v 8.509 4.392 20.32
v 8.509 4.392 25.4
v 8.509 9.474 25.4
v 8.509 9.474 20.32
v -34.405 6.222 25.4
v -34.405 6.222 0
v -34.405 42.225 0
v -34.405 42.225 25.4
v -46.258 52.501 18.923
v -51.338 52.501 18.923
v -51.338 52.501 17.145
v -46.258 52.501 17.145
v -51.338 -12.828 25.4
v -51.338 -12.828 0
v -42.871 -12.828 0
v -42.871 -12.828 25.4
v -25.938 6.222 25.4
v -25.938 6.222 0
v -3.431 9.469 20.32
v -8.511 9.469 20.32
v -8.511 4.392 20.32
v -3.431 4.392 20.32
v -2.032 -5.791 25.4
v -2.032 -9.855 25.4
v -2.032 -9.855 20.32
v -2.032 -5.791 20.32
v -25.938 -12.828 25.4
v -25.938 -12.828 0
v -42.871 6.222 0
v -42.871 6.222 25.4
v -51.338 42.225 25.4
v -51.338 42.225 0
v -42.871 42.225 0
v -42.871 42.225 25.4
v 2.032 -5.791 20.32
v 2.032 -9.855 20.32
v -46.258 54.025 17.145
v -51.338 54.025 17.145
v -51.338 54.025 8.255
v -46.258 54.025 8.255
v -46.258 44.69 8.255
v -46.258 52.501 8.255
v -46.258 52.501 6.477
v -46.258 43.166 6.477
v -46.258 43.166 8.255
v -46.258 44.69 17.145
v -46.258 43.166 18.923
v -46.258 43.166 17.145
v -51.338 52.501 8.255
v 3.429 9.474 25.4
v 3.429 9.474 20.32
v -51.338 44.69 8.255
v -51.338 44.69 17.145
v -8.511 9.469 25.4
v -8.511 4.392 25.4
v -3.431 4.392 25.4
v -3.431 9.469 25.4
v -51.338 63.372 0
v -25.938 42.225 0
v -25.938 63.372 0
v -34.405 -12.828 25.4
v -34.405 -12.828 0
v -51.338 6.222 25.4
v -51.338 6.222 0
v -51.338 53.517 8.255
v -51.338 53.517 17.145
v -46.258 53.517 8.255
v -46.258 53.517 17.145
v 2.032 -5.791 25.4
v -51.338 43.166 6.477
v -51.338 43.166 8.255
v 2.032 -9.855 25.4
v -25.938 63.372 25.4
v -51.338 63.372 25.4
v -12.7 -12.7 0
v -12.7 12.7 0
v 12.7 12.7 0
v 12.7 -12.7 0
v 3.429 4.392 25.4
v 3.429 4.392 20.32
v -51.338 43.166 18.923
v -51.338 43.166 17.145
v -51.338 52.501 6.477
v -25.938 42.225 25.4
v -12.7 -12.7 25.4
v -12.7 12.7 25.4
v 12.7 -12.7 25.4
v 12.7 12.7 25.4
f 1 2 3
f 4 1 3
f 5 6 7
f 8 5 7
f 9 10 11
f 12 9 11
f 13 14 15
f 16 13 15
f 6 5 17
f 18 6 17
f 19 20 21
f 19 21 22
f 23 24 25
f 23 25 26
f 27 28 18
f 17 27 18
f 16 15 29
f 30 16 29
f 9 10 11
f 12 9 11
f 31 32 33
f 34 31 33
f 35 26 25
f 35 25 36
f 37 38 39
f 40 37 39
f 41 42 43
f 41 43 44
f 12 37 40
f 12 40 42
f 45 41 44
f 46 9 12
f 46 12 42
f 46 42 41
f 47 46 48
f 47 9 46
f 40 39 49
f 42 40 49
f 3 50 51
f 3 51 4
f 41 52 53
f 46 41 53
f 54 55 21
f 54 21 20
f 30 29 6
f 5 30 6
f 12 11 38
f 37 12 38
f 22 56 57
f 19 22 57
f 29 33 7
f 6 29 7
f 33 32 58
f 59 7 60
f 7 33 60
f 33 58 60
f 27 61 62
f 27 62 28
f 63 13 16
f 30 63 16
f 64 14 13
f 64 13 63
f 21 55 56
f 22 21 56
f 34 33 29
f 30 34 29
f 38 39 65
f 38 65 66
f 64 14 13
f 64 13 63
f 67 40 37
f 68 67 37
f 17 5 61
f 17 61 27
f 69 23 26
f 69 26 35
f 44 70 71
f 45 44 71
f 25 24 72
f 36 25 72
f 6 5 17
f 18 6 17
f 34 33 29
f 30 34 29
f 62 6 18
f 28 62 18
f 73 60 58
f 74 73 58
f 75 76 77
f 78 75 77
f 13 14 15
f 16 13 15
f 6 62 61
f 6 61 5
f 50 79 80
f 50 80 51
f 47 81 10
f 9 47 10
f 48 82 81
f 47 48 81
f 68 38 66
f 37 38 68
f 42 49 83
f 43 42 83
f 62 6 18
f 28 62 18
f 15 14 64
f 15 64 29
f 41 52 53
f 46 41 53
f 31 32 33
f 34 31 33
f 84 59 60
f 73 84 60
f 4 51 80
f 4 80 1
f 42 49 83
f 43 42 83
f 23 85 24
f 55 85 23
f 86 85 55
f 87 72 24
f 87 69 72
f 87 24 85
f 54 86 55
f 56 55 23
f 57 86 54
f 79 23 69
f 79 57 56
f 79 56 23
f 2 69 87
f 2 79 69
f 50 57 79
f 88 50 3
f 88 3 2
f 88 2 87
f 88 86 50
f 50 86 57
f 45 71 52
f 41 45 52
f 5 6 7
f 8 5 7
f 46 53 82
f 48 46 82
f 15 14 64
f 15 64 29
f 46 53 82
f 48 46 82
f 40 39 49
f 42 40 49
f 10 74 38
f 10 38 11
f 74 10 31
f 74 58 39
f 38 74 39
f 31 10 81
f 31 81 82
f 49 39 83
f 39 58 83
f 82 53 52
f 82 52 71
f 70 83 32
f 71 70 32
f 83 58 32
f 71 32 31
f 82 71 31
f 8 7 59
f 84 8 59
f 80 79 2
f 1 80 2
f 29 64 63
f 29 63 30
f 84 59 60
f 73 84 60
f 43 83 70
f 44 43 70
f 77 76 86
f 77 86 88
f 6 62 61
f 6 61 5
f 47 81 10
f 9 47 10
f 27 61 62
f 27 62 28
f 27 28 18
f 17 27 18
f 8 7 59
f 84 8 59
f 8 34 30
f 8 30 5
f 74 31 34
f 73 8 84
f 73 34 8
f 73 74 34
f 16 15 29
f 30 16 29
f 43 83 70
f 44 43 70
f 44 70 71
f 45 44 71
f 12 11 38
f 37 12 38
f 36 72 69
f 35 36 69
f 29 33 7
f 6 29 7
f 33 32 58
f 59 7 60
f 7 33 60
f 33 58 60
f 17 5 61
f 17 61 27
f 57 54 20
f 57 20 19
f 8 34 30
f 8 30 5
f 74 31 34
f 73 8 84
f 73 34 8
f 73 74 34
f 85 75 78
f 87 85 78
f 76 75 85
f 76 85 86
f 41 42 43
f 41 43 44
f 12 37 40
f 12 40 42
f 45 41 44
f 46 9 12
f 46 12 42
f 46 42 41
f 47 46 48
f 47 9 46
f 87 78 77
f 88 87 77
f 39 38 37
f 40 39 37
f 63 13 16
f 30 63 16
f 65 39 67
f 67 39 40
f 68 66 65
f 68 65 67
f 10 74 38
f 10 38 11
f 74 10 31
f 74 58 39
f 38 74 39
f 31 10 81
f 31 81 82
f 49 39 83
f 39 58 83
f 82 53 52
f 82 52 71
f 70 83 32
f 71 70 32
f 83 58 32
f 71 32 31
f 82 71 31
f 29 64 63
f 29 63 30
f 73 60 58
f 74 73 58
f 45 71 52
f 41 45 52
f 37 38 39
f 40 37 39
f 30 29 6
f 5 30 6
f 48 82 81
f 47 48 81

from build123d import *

# Parameters (mm, degrees)
F0_W      = 25.4
F0_H      = 25.4
F1_DEPTH  = 25.4
F2_W      = 4.064
F2_H      = 4.064
F2_W_2    = 5.08
F2_H_2    = 5.077821
F2_H_3    = 5.08257
F3_DEPTH  = 5.08
F4_W      = 8.466667
F4_H      = 19.05
F5_DEPTH  = 25.4
F6_DEPTH  = 25.4
F8_DEPTH  = 5.08
F8_FACE_W = 5.08
F8_FACE_H = 8.89
F9_DEPTH  = 0.508


with BuildPart() as f1:
    # F0 (on Top) → F1 (new body)
    with BuildSketch(Plane.XY):
        Rectangle(F0_W, F0_H)
    extrude(amount=F1_DEPTH)

    # F2 (on face) → F3 (cut)
    with BuildSketch(Plane.XY.offset(25.4)):
        with Locations((0, -7.82259)):
            Rectangle(F2_W, F2_H)
        with Locations((-5.970961, 6.93054)):
            Rectangle(F2_W_2, F2_H_2)
        with Locations((5.969, 6.932915)):
            Rectangle(F2_W_2, F2_H_3)
    extrude(amount=-F3_DEPTH, mode=Mode.SUBTRACT)


with BuildPart() as f5:
    # F4 (on Top) → F5 (new body)
    with BuildSketch(Plane.XY):
        with Locations((-30.171395, -3.303093)):
            Rectangle(F4_W, F4_H)
        with Locations((-47.104729, -3.303093)):
            Rectangle(F4_W, F4_H)
        Polygon((-25.938062, 63.371907), (-51.338062, 63.371907), (-51.338062, 44.321907), (-51.338062, 42.224824), (-42.871395, 42.224824), (-34.404729, 42.224824), (-25.938062, 42.224824), align=None)
        Polygon((-34.404729, 6.221907), (-34.404729, 42.224824), (-42.871395, 42.224824), (-42.871395, 6.221907), (-38.638062, 6.221907), align=None)
    extrude(amount=F5_DEPTH)


with BuildPart() as f6:
    # F4 (on Top) → F6 (new body)
    with BuildSketch(Plane.XY):
        with Locations((-30.171395, -3.303093)):
            Rectangle(F4_W, F4_H)
        with Locations((-47.104729, -3.303093)):
            Rectangle(F4_W, F4_H)
        Polygon((-25.938062, 63.371907), (-51.338062, 63.371907), (-51.338062, 44.321907), (-51.338062, 42.224824), (-42.871395, 42.224824), (-34.404729, 42.224824), (-25.938062, 42.224824), align=None)
        Polygon((-34.404729, 6.221907), (-34.404729, 42.224824), (-42.871395, 42.224824), (-42.871395, 6.221907), (-38.638062, 6.221907), align=None)
    extrude(amount=F6_DEPTH)


with BuildPart() as f8_tool:
    # F7 (on face) → F8 (new body)
    with BuildSketch(Plane(origin=(-51.338062, 0, 0), x_dir=(0, -1, 0), z_dir=(-1, 0, 0))):
        Polygon((-54.024707, 17.145), (-54.024707, 8.255), (-52.500707, 8.255), (-52.500707, 6.477), (-43.166304, 6.477), (-43.166304, 8.255), (-44.690304, 8.255), (-44.690304, 17.145), (-43.166304, 17.145), (-43.166304, 18.923), (-52.500707, 18.923), (-52.500707, 17.145), align=None)
    extrude(amount=-F8_DEPTH)


with BuildPart() as f5_1:
    add(f5.part)

    # F8: cut by f8_tool
    add(f8_tool.part, mode=Mode.SUBTRACT)


with BuildPart() as f6_1:
    add(f6.part)

    # F8: cut by f8_tool
    add(f8_tool.part, mode=Mode.SUBTRACT)


with BuildPart() as f9:
    # F8_face (on face) → F9 (new body)
    with BuildSketch(Plane(origin=(-48.798062, 54.024707, 12.7), x_dir=(1, 0, 0), z_dir=(0, -1, 0))):
        Rectangle(F8_FACE_W, F8_FACE_H)
    extrude(amount=F9_DEPTH)


solid = Compound([f1.part, f5_1.part, f6_1.part, f9.part])
